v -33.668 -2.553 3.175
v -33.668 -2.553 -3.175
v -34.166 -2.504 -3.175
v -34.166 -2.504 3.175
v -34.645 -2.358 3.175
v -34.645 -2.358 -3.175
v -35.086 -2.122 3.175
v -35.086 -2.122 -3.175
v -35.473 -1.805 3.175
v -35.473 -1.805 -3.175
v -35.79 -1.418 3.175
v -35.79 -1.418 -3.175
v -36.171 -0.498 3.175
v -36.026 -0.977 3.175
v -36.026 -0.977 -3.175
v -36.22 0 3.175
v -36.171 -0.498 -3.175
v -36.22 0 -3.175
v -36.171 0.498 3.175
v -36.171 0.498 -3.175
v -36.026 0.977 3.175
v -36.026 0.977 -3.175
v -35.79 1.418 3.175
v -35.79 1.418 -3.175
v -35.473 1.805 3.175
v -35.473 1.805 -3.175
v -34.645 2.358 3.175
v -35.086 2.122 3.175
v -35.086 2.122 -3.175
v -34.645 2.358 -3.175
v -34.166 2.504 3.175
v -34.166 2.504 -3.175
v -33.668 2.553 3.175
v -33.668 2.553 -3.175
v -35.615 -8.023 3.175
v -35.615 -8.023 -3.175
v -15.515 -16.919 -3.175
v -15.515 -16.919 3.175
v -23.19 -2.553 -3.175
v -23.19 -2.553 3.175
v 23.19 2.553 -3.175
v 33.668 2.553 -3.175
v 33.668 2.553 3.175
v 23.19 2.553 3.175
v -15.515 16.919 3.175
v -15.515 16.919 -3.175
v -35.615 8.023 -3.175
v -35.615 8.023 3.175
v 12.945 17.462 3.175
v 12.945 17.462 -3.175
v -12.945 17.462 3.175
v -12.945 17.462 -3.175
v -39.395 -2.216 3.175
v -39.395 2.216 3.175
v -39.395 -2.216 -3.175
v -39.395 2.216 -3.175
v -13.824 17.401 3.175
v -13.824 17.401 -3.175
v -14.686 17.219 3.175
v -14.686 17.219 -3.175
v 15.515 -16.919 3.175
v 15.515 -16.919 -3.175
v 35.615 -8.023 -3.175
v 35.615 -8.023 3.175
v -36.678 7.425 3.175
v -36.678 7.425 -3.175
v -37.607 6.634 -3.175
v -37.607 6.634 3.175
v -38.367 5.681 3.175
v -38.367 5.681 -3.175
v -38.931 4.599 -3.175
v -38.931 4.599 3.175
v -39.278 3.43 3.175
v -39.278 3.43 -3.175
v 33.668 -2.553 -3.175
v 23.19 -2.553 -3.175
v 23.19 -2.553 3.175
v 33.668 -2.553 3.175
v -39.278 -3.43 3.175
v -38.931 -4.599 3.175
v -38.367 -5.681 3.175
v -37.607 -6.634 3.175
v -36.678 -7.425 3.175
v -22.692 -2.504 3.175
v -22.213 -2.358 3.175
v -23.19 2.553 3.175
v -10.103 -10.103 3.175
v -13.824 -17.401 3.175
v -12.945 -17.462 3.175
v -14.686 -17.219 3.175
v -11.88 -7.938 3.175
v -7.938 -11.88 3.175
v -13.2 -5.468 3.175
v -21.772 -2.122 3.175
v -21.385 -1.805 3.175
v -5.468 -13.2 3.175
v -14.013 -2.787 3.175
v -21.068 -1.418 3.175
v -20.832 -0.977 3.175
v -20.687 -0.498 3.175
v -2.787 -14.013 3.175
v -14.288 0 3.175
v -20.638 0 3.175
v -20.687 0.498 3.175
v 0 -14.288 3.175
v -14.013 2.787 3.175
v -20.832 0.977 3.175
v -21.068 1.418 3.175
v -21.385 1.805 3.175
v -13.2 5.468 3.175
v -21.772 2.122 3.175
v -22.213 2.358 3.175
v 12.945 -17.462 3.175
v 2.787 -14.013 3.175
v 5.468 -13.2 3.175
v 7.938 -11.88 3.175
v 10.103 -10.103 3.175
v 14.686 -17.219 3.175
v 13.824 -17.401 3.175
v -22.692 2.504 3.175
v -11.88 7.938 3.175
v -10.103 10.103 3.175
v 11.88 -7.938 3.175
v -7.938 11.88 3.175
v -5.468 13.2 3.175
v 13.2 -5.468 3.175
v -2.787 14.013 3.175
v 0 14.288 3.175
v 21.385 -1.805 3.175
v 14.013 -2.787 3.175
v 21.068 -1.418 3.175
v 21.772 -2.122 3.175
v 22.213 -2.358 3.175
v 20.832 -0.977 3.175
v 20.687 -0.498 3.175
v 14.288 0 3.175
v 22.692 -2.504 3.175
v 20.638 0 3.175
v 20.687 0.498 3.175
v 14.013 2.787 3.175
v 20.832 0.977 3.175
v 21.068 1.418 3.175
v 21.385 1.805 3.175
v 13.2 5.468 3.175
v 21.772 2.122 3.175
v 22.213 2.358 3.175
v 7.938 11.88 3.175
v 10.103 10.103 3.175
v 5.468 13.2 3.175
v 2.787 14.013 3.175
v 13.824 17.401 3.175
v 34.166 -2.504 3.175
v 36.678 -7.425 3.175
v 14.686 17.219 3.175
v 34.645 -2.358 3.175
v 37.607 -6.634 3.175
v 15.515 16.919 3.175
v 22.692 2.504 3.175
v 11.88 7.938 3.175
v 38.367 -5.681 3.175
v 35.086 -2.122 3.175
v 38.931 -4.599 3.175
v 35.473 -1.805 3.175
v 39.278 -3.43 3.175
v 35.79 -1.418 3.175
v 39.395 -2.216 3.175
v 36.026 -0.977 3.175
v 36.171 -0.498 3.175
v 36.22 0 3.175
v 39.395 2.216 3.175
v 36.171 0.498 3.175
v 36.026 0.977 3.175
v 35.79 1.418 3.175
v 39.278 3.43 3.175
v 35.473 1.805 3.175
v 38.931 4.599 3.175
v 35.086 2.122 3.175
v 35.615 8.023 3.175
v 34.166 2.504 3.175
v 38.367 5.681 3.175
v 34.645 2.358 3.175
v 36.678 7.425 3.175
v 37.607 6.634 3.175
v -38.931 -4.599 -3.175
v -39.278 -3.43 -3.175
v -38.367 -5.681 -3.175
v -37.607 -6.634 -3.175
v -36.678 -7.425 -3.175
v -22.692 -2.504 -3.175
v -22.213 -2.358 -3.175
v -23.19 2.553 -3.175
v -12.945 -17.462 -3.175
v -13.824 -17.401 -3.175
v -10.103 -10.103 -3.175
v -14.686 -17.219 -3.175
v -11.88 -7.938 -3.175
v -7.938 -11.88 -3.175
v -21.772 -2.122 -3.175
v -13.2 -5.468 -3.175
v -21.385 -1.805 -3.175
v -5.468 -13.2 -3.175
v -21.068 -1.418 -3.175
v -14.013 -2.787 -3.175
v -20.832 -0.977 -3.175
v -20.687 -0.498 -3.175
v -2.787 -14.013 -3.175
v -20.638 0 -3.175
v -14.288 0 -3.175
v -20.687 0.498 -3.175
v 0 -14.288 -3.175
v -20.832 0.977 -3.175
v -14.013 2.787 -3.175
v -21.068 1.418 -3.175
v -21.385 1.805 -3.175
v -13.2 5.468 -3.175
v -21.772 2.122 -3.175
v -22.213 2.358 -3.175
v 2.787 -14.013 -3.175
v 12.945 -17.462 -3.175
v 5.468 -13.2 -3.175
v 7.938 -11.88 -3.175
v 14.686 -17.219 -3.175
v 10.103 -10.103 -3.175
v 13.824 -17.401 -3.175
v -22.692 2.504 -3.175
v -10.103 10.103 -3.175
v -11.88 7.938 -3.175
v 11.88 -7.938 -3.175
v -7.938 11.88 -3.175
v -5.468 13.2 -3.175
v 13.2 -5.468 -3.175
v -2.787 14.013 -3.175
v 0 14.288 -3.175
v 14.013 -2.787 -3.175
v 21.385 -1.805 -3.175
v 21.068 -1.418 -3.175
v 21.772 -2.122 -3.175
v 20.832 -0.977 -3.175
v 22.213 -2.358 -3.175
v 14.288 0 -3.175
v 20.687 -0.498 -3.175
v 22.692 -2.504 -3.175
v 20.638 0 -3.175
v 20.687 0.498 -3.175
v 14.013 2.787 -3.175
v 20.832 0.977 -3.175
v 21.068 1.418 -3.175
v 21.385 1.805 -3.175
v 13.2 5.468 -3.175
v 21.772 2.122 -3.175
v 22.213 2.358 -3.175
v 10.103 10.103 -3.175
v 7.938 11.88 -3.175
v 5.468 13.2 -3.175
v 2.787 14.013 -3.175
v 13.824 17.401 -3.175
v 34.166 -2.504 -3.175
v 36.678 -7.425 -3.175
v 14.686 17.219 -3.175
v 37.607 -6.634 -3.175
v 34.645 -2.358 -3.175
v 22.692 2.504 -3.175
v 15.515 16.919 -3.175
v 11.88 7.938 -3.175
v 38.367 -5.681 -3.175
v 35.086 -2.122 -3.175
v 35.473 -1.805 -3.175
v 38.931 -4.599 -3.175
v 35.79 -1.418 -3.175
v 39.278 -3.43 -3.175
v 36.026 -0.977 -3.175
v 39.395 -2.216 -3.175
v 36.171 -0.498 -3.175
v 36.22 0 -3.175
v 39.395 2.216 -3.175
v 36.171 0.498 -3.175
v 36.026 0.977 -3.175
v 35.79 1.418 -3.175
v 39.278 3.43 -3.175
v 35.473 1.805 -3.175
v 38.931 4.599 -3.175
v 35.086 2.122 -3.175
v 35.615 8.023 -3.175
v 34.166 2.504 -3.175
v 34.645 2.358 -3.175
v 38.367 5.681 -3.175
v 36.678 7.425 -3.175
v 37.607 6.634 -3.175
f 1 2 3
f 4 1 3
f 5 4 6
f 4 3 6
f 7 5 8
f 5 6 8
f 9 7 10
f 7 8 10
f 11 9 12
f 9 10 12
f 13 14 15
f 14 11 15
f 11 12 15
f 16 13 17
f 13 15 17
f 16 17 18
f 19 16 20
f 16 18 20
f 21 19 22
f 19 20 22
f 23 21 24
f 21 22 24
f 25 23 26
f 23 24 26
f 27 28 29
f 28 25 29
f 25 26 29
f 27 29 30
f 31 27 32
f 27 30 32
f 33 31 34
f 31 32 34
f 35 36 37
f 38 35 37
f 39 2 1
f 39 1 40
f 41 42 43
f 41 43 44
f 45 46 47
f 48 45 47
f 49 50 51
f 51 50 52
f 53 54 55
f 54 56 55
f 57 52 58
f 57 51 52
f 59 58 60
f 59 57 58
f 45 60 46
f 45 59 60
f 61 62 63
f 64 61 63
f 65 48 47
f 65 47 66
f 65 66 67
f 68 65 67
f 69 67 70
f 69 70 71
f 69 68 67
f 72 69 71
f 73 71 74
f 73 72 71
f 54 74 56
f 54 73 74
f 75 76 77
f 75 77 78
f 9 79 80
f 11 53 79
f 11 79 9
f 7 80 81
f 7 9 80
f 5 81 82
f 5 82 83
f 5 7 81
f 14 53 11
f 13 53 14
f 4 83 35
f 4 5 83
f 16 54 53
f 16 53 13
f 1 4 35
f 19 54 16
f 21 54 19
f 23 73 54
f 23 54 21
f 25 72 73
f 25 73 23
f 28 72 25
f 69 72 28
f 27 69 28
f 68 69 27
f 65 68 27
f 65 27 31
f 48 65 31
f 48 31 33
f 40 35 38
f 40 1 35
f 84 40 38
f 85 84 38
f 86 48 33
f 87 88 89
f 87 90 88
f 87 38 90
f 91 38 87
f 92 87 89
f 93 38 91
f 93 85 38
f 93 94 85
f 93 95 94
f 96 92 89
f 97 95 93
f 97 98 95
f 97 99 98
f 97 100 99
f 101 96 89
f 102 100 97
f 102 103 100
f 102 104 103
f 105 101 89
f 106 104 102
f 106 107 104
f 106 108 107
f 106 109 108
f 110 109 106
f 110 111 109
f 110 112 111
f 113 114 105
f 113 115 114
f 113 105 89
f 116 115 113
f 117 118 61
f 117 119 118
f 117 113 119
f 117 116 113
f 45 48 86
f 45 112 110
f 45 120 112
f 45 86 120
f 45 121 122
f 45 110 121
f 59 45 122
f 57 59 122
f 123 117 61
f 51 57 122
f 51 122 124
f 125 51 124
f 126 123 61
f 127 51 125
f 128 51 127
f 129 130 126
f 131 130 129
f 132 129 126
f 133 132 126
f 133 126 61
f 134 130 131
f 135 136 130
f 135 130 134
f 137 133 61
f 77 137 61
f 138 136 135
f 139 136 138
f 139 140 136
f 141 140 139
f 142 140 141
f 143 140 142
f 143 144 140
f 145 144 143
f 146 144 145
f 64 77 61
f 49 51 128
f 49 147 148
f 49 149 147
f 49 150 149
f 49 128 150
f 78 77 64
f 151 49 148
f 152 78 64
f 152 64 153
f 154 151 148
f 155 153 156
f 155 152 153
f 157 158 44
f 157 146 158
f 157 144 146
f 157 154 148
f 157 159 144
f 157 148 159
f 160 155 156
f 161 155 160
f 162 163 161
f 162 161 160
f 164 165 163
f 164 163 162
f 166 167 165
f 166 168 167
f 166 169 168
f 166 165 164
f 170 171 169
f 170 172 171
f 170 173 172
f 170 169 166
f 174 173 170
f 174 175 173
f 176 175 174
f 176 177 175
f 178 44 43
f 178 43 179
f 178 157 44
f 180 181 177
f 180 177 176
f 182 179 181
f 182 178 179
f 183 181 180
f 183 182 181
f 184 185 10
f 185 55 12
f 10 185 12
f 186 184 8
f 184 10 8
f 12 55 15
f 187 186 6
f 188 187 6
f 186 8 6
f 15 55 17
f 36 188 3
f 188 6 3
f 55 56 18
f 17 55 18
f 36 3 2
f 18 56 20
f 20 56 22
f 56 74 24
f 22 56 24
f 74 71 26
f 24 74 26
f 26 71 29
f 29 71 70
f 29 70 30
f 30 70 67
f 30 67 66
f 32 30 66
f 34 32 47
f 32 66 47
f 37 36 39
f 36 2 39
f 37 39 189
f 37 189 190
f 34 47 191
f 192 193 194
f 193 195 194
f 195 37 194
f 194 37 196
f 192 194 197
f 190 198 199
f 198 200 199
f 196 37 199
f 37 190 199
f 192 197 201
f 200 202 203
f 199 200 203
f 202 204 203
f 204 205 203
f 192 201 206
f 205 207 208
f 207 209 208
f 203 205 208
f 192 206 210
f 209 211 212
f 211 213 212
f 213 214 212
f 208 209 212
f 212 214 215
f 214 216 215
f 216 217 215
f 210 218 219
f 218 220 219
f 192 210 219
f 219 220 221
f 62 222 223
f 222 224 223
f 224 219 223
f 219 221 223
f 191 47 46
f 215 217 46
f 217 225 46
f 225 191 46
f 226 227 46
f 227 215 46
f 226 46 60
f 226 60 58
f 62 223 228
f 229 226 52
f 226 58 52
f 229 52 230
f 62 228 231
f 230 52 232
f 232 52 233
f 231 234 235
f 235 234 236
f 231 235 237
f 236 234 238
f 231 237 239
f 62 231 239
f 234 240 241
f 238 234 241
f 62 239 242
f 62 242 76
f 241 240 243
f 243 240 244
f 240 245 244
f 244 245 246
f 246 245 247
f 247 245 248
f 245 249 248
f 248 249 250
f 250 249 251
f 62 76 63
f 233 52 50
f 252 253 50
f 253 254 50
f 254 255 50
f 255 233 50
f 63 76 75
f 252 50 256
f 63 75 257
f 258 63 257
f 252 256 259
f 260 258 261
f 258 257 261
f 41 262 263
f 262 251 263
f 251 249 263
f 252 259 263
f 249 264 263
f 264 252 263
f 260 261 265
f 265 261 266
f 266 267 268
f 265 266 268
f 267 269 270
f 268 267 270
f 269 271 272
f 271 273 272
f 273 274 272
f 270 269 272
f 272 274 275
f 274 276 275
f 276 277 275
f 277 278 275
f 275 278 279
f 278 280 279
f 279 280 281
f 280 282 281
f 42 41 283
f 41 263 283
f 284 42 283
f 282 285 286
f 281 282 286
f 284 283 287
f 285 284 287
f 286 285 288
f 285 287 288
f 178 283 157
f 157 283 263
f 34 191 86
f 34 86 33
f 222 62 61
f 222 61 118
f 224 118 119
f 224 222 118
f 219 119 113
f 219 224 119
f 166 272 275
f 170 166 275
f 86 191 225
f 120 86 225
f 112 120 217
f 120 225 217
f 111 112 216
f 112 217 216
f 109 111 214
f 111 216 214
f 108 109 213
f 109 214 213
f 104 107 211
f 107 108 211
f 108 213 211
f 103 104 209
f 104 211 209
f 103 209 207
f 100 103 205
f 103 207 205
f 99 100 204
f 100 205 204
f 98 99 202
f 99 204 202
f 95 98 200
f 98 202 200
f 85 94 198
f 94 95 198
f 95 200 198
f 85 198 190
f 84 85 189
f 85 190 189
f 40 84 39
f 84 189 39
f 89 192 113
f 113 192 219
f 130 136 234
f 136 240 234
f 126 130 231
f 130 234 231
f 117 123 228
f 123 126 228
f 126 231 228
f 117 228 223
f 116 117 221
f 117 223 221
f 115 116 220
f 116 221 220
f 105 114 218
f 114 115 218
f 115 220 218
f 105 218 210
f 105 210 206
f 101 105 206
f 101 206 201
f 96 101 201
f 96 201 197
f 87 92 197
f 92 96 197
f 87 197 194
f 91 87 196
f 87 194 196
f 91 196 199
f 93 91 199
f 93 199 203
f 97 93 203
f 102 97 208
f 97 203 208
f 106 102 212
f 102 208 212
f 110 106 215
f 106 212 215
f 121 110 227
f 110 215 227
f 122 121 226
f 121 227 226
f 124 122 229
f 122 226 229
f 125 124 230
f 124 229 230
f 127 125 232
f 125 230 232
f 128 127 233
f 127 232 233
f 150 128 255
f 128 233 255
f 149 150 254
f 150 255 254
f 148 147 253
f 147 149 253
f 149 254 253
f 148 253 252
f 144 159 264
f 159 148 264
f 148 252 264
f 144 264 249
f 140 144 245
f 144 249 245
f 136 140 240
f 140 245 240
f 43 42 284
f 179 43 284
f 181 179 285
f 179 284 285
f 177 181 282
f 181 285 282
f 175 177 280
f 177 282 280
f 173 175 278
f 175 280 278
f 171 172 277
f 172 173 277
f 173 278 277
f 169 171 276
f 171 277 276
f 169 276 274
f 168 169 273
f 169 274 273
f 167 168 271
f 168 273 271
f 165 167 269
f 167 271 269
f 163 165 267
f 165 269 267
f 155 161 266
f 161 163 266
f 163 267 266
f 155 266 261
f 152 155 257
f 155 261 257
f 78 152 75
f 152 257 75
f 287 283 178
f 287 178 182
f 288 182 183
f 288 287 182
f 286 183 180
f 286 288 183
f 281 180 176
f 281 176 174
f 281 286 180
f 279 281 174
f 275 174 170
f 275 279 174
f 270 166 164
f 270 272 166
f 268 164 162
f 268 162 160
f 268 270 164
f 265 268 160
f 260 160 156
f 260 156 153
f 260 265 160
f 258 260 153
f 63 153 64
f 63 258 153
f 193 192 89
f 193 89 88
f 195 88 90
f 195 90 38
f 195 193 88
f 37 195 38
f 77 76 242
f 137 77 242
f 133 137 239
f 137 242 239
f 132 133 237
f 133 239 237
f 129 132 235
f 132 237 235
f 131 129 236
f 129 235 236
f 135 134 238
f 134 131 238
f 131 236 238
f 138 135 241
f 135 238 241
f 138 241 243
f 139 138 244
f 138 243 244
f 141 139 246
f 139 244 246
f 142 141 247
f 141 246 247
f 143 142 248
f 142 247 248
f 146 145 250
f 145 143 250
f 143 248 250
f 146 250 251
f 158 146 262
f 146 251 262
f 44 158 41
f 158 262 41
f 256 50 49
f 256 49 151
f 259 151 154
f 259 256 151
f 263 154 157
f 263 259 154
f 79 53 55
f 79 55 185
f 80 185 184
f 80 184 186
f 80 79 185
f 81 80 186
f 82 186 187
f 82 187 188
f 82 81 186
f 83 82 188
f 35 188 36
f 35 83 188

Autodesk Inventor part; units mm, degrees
ref_plane "YZ Plane" through (0, 0, 0) normal (1, 0, 0) x (0, 1, 0)
ref_plane "XZ Plane" through (0, 0, 0) normal (0, 1, 0) x (-1, 0, 0)
sketch "Sketch1" plane through (0, 0, 0) normal (0, 0, 1) x (1, 0, 0)
  circle A0 centre (0, 0) radius 14.2875
  line L0 (-33.6677, 0) -> (-23.1902, 0) construction
  line L1 (-33.6677, -2.5527) -> (-23.1902, -2.5527)
  line L2 (-23.1902, 2.5527) -> (-33.6677, 2.5527)
  arc A1 (-33.6677, 2.5527) -> (-33.6677, -2.5527) centre (-33.6677, 0) ccw
  arc A2 (-23.1902, -2.5527) -> (-23.1902, 2.5527) centre (-23.1902, 0) ccw
  line L3 (23.1902, 0) -> (33.6677, 0) construction
  line L4 (23.1902, -2.5527) -> (33.6677, -2.5527)
  line L5 (33.6677, 2.5527) -> (23.1902, 2.5527)
  arc A3 (23.1902, 2.5527) -> (23.1902, -2.5527) centre (23.1902, 0) ccw
  arc A4 (33.6677, -2.5527) -> (33.6677, 2.5527) centre (33.6677, 0) ccw
  line L6 (-14.2875, 17.4625) -> (-39.3954, 6.35)
  line L7 (-39.3954, 6.35) -> (-39.3954, -6.35)
  line L8 (-39.3954, -6.35) -> (-14.2875, -17.4625)
  line L9 (-14.2875, -17.4625) -> (14.2875, -17.4625)
  line L10 (14.2875, -17.4625) -> (39.3954, -6.35)
  line L11 (39.3954, -6.35) -> (39.3954, 6.35)
  line L12 (39.3954, 6.35) -> (14.2875, 17.4625)
  line L13 (14.2875, 17.4625) -> (-14.2875, 17.4625)
  circle A5 centre (-23.1902, 0) radius 4.7625 construction
  circle A6 centre (0, 0) radius 13.6398 construction
  circle A7 centre (-45.9552, 70.4429) radius 54.5719 construction
  circle A8 centre (-1.8189, -39.1868) radius 18.1864 construction
  line L14 (8.4839, 74.2476) -> (16.3232, -37.9189) construction
  line L15 (-15.7788, -50.843) -> (-87.8447, 35.4663) construction
  line L16 (-45.9552, 70.4429) -> (4.7485, 67.3163) construction
  line L17 (4.7485, 67.3163) -> (-1.8189, -39.1868) construction
  point P0 (-28.429, 0)
  point P1 (28.429, 0)
  point P2 (0, 17.4625)
  point P3 (0, 14.2875)
  point P4 (-20.6375, 0)
  point P5 (-14.2875, 0)
  point P6 (-36.2204, 0)
  point P7 (-39.3954, 0)
  point P8 (39.3954, 0)
  dimension "d0" = 28.575
  dimension "d3" = 28.575
  dimension "d4" = 3.175
  dimension "d5" = 17.4625
  dimension "d6" = 17.4625
  dimension "d7" = 10.4775
  dimension "d8" = 10.4775
  dimension "d9" = 6.35
  dimension "d10" = 5.1054
  dimension "d11" = 28.429
  dimension "d12" = 9.525
  dimension "d13" = 27.2796
  dimension "d16" = 109.1438
  dimension "d19" = 36.3728
  dimension "d20" = 106.7054
  dimension "d21" = 50.8
  dimension "d22" = 28.429
  dimension "d23" = 3.175
  dimension "d24" = 5.7277
  dimension "d25" = 5.7277
  dimension "d26" = 12.7
extrude "Extrusion1" add sketch "Sketch1" along normal mid plane 6.35
fillet "Fillet1" radius 6.35 8 edges at (-14.2875, 17.4625, 0) (14.2875, 17.4625, 0) (39.3954, 6.35, 0) (39.3954, -6.35, 0) (14.2875, -17.4625, 0) (-14.2875, -17.4625, 0) (-39.3954, -6.35, 0) (-39.3954, 6.35, 0)
ref_plane "Work Plane1" through (-33.6677, 0, 3.175) normal (0, 1, 0) x (1, 0, 0)
equation "\"d6\" = d5"
properties part number "EL2-CGB-010" material "Aluminum 6061"
